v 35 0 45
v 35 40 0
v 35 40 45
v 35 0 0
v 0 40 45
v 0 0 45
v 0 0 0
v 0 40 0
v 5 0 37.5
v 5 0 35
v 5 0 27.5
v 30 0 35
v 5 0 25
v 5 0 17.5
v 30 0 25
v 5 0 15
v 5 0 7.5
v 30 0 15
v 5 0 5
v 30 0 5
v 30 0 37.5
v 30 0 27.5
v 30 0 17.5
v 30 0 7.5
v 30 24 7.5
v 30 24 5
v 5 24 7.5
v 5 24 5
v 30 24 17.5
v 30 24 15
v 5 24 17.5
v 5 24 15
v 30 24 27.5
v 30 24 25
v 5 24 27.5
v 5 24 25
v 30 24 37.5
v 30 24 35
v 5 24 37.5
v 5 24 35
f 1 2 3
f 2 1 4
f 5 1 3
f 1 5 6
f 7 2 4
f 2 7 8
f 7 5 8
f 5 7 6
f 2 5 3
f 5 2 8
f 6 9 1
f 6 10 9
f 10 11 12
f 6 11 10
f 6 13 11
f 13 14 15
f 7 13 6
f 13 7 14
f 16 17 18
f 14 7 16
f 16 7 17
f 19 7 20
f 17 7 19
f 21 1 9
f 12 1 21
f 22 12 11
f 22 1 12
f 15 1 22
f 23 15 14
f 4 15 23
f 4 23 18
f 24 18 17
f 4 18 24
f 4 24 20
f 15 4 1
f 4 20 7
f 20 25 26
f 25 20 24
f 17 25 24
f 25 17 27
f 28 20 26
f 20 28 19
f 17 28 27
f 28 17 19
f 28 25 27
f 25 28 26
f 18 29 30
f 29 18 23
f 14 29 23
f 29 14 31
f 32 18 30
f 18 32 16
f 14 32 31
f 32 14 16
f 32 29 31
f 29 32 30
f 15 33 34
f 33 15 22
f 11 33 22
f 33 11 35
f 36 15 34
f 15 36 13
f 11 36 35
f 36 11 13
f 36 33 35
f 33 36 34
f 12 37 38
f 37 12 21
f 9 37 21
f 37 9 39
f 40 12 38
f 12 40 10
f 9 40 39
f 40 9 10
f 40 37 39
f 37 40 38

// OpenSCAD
difference()
{
	translate([0,0,0]) cube([35,40,45]);
	translate([5,-1,5]) cube([25,25,2.5]);
	translate([5,-1,15]) cube([25,25,2.5]);
	translate([5,-1,25]) cube([25,25,2.5]);
	translate([5,-1,35]) cube([25,25,2.5]);
}
